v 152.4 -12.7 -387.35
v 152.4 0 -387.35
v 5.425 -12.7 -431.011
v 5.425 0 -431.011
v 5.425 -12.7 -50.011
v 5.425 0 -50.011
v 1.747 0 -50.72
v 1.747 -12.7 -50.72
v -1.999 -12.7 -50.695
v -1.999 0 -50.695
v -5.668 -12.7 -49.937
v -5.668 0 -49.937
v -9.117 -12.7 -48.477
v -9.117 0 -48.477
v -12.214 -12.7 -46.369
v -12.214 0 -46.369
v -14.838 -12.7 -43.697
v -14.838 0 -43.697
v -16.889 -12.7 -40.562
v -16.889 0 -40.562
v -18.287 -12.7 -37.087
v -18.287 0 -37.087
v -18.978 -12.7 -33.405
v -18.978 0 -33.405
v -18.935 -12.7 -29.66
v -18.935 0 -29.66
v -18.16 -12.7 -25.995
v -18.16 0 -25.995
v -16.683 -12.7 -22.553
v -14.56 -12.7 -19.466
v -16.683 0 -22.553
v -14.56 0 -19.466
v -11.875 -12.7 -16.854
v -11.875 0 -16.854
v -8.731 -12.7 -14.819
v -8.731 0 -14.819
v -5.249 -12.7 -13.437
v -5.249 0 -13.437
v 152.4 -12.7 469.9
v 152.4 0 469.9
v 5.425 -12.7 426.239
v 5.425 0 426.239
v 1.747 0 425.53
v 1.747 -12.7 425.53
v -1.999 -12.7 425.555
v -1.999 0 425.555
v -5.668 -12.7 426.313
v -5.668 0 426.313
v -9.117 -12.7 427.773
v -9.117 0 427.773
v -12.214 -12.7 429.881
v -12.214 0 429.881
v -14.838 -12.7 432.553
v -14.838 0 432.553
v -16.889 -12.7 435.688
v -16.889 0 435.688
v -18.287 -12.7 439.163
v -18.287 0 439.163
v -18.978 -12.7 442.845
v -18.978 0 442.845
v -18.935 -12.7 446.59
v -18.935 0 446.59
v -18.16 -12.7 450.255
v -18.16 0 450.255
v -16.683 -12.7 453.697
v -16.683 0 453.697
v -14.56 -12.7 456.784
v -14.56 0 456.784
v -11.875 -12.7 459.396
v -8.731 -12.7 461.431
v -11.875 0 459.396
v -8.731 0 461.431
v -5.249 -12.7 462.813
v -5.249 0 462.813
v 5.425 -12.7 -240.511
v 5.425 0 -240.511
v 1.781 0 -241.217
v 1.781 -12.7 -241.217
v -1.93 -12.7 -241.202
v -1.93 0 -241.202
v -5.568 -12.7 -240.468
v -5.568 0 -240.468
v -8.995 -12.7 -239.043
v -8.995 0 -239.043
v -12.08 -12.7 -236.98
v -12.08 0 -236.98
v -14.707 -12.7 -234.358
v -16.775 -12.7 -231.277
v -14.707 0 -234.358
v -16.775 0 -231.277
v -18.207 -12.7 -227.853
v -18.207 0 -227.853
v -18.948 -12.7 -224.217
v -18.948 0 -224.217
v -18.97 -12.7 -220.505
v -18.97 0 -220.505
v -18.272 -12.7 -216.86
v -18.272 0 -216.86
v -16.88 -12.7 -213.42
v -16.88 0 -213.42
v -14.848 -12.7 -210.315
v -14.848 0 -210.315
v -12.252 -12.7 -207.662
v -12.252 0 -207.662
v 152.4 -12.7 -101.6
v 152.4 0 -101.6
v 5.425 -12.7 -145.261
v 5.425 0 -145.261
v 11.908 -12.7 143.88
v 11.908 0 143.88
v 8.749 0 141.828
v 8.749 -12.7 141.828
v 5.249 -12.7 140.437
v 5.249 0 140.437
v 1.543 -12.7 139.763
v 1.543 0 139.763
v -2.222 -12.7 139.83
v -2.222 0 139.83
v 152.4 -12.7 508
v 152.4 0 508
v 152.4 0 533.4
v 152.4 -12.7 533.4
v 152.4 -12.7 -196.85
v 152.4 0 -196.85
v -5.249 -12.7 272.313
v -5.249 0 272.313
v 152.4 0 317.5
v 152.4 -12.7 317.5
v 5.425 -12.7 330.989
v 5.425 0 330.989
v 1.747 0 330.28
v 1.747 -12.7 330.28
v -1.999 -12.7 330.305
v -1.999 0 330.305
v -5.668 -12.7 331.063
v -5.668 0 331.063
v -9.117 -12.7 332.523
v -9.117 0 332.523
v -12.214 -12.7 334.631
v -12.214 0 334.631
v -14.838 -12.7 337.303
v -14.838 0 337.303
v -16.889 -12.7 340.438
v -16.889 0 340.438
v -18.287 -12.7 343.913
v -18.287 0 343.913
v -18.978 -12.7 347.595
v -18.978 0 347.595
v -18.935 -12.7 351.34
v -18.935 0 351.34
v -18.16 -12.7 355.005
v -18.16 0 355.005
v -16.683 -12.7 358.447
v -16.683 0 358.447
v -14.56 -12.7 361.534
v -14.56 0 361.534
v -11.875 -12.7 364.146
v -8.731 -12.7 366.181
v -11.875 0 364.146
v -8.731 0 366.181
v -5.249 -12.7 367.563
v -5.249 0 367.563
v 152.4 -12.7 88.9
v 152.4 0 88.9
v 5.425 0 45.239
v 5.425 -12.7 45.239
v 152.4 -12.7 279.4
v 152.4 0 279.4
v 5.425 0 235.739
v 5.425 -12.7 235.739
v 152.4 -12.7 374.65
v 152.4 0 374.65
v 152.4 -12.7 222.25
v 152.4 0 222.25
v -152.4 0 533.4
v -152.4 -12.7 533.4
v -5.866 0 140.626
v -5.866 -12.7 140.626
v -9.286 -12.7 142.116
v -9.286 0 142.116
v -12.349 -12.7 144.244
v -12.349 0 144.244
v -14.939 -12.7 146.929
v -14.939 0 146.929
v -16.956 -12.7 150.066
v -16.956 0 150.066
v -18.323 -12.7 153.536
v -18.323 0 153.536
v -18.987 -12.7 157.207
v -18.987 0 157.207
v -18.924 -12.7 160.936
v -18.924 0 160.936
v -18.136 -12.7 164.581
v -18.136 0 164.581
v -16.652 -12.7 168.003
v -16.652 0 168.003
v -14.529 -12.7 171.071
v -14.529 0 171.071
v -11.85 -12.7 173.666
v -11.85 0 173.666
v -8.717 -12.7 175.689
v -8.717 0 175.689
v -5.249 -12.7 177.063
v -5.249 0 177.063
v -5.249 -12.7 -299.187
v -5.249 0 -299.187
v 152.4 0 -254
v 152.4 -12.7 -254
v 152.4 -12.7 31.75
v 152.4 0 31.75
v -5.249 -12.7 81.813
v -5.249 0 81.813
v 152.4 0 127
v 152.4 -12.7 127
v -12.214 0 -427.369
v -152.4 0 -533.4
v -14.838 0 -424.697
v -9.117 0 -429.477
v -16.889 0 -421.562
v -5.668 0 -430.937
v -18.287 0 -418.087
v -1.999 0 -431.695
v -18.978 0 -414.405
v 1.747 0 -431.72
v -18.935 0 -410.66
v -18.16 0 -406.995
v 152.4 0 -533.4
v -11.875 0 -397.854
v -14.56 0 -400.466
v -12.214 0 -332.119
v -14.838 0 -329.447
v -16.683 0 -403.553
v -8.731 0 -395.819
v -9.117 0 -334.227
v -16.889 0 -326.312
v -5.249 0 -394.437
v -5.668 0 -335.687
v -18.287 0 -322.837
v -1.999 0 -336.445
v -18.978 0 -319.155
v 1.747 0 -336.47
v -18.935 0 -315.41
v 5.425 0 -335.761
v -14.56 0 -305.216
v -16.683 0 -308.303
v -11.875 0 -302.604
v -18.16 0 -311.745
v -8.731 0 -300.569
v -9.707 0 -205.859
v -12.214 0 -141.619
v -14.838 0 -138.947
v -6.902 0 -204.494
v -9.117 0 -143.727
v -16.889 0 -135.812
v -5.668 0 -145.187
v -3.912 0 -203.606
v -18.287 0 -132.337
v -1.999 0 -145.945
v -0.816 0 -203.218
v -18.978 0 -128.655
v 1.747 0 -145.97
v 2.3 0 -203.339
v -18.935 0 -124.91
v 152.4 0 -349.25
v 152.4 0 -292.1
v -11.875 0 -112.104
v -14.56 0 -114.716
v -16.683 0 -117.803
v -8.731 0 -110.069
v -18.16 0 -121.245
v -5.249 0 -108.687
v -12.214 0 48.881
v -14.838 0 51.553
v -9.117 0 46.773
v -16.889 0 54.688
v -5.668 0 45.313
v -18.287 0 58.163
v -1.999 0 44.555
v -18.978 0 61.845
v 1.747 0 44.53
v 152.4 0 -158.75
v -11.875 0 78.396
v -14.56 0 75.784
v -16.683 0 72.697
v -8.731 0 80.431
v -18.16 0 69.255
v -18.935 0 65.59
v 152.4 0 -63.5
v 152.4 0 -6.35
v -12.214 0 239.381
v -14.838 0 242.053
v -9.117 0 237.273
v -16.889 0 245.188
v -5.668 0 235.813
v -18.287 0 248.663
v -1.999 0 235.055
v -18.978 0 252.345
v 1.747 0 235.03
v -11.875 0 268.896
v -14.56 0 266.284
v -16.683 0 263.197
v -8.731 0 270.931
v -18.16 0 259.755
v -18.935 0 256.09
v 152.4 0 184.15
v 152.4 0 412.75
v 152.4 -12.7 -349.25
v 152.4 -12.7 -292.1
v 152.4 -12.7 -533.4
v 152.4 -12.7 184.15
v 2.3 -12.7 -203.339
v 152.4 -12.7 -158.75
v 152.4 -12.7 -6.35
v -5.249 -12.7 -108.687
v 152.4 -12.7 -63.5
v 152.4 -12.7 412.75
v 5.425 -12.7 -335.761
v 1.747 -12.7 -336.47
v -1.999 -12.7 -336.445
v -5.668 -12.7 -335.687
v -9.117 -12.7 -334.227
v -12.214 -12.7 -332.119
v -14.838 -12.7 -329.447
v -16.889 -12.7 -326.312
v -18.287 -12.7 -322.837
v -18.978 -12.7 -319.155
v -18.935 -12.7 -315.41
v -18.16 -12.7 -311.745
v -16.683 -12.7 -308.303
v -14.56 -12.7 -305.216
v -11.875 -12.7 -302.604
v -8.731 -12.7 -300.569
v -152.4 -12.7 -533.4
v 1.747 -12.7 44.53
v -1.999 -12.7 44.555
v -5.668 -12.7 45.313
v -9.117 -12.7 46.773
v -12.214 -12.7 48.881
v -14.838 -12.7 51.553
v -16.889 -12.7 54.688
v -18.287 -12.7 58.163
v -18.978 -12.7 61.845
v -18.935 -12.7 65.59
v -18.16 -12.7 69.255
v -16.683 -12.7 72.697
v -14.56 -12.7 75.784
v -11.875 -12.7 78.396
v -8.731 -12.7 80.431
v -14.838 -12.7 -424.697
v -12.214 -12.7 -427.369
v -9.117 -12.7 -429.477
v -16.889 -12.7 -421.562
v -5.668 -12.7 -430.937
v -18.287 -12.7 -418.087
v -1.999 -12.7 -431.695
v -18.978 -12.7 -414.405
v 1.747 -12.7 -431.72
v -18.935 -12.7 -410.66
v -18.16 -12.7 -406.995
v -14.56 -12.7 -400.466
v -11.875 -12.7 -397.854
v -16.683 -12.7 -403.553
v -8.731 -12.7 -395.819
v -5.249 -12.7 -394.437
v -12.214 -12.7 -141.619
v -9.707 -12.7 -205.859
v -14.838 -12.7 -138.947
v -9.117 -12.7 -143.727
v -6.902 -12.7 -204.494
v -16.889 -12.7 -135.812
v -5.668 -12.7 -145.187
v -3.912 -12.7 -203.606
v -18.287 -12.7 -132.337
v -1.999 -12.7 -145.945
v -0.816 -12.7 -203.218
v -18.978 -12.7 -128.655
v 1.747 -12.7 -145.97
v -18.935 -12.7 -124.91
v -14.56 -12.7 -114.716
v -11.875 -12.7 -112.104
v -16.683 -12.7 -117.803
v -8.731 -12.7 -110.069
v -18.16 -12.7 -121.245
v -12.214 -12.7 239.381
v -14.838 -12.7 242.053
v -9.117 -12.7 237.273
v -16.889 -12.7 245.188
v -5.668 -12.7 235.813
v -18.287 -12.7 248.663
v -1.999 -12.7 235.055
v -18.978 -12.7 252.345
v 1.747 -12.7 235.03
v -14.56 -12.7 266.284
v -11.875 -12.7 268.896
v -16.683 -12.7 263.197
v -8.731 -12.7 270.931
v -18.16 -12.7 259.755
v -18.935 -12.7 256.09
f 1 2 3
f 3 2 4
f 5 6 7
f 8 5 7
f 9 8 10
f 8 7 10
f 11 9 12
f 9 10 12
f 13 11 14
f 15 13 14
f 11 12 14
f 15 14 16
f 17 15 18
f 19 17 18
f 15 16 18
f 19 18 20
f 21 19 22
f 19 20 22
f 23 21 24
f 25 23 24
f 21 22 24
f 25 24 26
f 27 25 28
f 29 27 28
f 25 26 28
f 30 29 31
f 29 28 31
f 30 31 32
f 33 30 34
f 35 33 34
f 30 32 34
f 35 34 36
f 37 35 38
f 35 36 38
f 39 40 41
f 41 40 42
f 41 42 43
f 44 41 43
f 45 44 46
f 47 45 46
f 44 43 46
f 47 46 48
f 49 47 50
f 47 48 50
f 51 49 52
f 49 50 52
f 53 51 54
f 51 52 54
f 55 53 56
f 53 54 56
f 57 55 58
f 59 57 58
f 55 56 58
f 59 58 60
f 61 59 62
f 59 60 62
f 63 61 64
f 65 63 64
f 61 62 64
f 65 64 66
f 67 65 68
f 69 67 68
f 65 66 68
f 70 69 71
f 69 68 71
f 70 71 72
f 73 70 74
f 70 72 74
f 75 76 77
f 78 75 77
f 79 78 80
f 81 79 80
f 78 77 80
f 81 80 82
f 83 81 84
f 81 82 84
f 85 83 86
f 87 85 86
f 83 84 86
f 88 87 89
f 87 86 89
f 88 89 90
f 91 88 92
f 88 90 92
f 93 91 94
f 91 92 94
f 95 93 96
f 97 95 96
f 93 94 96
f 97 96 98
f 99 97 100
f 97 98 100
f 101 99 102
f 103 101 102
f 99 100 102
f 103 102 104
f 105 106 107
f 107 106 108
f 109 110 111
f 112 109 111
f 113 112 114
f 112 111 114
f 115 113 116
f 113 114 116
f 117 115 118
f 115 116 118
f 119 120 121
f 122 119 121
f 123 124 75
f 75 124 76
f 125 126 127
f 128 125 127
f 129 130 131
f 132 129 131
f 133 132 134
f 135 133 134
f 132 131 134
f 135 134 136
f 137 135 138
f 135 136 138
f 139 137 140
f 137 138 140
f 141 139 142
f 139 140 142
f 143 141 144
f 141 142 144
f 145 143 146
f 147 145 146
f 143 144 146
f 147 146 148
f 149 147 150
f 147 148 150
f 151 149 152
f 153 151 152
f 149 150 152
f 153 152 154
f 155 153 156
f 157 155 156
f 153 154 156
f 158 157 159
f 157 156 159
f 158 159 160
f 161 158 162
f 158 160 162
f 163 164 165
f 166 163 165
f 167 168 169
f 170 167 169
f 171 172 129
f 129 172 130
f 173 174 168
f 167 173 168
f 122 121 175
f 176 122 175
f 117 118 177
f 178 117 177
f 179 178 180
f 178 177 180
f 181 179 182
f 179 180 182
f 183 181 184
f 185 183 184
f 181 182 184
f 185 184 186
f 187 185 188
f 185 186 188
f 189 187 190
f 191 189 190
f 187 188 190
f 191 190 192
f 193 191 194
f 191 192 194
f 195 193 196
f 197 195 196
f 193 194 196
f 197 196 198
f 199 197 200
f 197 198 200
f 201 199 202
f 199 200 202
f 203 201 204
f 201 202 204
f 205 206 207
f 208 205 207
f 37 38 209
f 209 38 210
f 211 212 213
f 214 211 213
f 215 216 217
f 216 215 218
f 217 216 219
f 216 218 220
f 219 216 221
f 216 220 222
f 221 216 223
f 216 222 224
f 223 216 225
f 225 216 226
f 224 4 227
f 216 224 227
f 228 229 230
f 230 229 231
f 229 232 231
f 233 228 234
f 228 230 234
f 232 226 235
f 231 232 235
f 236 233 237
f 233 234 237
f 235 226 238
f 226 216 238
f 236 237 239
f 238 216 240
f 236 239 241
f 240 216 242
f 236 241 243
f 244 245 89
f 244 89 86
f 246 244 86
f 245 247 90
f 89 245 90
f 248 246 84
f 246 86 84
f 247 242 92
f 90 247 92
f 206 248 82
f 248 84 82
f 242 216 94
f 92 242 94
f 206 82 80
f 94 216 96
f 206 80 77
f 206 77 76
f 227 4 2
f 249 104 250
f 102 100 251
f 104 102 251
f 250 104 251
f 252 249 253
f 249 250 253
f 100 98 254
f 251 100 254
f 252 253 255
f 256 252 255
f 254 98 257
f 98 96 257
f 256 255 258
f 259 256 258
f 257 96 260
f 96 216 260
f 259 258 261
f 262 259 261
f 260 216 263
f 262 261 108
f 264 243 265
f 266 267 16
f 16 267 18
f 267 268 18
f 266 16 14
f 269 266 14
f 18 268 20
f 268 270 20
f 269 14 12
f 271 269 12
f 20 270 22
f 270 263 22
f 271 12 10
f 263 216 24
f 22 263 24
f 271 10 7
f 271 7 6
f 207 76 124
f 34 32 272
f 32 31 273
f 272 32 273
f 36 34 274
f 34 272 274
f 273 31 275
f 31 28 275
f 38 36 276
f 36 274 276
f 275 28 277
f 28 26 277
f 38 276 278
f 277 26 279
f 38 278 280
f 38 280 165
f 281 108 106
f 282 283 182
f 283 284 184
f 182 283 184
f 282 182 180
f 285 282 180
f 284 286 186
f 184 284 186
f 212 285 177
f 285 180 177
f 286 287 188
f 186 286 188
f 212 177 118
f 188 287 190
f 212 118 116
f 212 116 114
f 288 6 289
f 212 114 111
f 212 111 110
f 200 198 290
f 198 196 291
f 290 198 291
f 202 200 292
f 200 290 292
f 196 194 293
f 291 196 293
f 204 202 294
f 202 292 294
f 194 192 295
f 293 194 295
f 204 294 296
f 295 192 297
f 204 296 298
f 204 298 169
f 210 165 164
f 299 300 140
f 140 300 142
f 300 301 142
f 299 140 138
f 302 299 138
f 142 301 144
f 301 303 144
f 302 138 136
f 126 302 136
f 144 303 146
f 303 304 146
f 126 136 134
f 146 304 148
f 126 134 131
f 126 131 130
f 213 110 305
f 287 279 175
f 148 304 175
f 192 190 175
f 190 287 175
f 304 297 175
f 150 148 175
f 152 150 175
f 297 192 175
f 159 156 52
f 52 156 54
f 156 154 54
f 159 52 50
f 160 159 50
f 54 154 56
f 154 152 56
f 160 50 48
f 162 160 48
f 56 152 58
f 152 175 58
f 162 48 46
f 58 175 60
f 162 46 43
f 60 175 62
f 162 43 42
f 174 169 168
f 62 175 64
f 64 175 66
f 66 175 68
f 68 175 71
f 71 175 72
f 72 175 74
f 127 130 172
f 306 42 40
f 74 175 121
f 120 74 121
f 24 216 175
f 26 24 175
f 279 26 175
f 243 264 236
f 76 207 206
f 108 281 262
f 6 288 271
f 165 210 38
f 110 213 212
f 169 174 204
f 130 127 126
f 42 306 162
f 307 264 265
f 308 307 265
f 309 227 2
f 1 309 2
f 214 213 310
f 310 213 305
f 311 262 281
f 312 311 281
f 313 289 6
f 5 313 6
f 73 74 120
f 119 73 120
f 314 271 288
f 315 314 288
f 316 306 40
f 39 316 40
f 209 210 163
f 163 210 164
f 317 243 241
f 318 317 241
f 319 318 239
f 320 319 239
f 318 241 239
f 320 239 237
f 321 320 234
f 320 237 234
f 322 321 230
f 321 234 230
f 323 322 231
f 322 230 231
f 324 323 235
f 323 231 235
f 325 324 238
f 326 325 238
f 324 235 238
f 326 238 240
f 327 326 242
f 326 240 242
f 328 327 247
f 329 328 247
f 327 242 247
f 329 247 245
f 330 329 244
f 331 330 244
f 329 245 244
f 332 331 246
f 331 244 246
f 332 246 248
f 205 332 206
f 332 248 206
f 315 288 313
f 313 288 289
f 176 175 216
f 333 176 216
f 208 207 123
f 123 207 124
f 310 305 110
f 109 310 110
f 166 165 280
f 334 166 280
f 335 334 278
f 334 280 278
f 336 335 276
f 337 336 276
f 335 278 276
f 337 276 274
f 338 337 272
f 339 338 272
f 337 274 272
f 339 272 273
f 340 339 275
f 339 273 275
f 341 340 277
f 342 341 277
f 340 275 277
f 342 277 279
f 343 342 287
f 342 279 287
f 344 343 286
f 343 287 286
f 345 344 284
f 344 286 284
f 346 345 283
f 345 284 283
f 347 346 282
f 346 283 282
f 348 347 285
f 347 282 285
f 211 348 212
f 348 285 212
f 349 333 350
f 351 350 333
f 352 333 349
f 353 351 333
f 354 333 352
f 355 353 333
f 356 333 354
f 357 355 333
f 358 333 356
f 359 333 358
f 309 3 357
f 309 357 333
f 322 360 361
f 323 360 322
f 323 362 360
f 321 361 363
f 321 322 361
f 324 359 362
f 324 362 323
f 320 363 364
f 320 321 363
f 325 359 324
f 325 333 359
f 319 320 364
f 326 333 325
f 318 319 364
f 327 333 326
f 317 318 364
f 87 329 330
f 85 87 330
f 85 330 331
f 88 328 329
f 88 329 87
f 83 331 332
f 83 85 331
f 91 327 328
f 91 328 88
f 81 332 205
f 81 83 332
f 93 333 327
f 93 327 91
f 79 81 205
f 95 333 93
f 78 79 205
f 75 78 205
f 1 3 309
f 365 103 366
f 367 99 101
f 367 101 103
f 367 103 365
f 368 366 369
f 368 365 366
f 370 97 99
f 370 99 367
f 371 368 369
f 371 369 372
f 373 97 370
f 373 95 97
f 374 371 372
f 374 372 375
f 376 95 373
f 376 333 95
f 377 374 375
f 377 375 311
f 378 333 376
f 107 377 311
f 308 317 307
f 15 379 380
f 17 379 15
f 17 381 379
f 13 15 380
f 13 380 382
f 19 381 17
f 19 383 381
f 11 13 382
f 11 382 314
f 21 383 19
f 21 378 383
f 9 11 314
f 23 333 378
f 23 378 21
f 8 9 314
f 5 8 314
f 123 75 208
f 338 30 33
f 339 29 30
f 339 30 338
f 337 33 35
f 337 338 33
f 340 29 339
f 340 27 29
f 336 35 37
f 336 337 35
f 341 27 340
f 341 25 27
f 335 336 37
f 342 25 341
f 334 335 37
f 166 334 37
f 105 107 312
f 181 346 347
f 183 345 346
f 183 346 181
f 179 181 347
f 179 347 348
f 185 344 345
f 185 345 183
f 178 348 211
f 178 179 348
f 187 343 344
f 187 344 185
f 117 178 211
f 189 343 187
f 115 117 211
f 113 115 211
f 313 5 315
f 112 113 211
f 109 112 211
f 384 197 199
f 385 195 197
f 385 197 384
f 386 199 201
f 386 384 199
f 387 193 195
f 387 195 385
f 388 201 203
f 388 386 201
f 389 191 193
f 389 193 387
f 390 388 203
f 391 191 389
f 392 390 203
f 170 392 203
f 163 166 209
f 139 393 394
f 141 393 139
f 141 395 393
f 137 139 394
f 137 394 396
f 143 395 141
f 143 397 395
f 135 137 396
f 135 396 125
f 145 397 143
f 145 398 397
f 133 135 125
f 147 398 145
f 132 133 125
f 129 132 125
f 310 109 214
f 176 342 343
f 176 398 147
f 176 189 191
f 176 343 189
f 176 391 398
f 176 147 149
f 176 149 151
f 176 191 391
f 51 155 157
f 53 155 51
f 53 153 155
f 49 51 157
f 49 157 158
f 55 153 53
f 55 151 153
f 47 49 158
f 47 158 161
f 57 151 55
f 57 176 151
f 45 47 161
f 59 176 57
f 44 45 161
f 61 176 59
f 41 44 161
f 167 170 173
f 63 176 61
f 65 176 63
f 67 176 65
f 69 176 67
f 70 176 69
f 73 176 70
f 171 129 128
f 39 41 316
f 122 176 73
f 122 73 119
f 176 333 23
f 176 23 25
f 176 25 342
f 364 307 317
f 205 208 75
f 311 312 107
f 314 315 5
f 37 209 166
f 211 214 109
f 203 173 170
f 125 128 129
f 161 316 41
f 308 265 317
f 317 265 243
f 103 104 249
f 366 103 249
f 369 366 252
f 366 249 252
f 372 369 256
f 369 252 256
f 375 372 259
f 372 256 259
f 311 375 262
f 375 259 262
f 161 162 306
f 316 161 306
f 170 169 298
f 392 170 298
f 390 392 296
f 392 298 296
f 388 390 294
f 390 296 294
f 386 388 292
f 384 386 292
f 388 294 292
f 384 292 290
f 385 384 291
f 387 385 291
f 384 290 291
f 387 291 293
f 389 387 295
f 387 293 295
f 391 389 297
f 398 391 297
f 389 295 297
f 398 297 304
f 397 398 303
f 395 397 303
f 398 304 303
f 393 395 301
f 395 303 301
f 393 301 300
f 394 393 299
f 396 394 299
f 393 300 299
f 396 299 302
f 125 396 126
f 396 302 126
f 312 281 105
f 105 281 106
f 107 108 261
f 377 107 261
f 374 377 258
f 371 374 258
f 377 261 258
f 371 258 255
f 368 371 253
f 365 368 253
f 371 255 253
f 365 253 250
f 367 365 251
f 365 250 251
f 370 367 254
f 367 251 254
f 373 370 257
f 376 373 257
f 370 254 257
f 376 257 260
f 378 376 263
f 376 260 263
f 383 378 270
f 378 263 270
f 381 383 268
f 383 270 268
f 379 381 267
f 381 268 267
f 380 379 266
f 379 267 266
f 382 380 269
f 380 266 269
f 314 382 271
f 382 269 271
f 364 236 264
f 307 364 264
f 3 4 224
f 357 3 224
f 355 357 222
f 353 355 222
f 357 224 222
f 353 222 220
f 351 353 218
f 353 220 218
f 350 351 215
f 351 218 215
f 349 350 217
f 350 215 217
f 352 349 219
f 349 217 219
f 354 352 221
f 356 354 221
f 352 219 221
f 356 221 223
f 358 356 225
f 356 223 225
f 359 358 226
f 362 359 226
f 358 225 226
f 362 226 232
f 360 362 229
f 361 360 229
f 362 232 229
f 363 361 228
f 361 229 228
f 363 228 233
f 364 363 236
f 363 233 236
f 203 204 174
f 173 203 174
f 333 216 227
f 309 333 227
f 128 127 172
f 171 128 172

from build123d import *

# Parameters (mm, degrees)
F1_DEPTH = 12.7


with BuildPart() as f1:
    # F0 (on Front) → F1 (new body)
    with BuildSketch(Plane.XZ):
        with BuildLine():
            Line((152.4, 508), (152.4, 533.4))
            Line((152.4, 533.4), (-152.4, 533.4))
            Line((-152.4, 533.4), (-152.4, -533.4))
            Line((-152.4, -533.4), (152.4, -533.4))
            Line((152.4, -533.4), (152.4, -387.35))
            Line((152.4, -387.35), (5.424796, -431.011273))
            ThreePointArc((5.424796, -431.011273), (-18.287138, -418.086955), (-5.248992, -394.43742))
            Line((-5.248992, -394.43742), (152.4, -349.25))
            Line((152.4, -349.25), (152.4, -292.1))
            Line((152.4, -292.1), (5.424796, -335.761273))
            ThreePointArc((5.424796, -335.761273), (-18.287138, -322.836955), (-5.248992, -299.18742))
            Line((-5.248992, -299.18742), (152.4, -254))
            Line((152.4, -254), (152.4, -196.85))
            Line((152.4, -196.85), (5.424796, -240.511273))
            ThreePointArc((5.424796, -240.511273), (-16.775419, -231.277061), (-12.251628, -207.66233))
            ThreePointArc((-12.251628, -207.66233), (-5.424796, -203.988727), (2.300448, -203.339409))
            Line((2.300448, -203.339409), (152.4, -158.75))
            Line((152.4, -158.75), (152.4, -101.6))
            Line((152.4, -101.6), (5.424796, -145.261273))
            ThreePointArc((5.424796, -145.261273), (-18.287138, -132.336955), (-5.248992, -108.68742))
            Line((-5.248992, -108.68742), (152.4, -63.5))
            Line((152.4, -63.5), (152.4, -6.35))
            Line((152.4, -6.35), (5.424796, -50.011273))
            ThreePointArc((5.424796, -50.011273), (-18.287138, -37.086955), (-5.248992, -13.43742))
            Line((-5.248992, -13.43742), (152.4, 31.75))
            Line((152.4, 31.75), (152.4, 88.9))
            Line((152.4, 88.9), (5.424796, 45.238727))
            ThreePointArc((5.424796, 45.238727), (-18.287138, 58.163045), (-5.248992, 81.81258))
            Line((-5.248992, 81.81258), (152.4, 127))
            Line((152.4, 127), (152.4, 184.15))
            Line((152.4, 184.15), (11.907693, 143.880254))
            ThreePointArc((11.907693, 143.880254), (5.248992, 140.43742), (-2.222457, 139.830085))
            ThreePointArc((-2.222457, 139.830085), (-18.987372, 157.206565), (-5.248992, 177.06258))
            Line((-5.248992, 177.06258), (152.4, 222.25))
            Line((152.4, 222.25), (152.4, 279.4))
            Line((152.4, 279.4), (5.424796, 235.738727))
            ThreePointArc((5.424796, 235.738727), (-18.287138, 248.663045), (-5.248992, 272.31258))
            Line((-5.248992, 272.31258), (152.4, 317.5))
            Line((152.4, 317.5), (152.4, 374.65))
            Line((152.4, 374.65), (5.424796, 330.988727))
            ThreePointArc((5.424796, 330.988727), (-18.287138, 343.913045), (-5.248992, 367.56258))
            Line((-5.248992, 367.56258), (152.4, 412.75))
            Line((152.4, 412.75), (152.4, 469.9))
            Line((152.4, 469.9), (5.424796, 426.238727))
            ThreePointArc((5.424796, 426.238727), (-18.287138, 439.163045), (-5.248992, 462.81258))
            Line((-5.248992, 462.81258), (152.4, 508))
        make_face()
    extrude(amount=F1_DEPTH)


solid = f1.part
